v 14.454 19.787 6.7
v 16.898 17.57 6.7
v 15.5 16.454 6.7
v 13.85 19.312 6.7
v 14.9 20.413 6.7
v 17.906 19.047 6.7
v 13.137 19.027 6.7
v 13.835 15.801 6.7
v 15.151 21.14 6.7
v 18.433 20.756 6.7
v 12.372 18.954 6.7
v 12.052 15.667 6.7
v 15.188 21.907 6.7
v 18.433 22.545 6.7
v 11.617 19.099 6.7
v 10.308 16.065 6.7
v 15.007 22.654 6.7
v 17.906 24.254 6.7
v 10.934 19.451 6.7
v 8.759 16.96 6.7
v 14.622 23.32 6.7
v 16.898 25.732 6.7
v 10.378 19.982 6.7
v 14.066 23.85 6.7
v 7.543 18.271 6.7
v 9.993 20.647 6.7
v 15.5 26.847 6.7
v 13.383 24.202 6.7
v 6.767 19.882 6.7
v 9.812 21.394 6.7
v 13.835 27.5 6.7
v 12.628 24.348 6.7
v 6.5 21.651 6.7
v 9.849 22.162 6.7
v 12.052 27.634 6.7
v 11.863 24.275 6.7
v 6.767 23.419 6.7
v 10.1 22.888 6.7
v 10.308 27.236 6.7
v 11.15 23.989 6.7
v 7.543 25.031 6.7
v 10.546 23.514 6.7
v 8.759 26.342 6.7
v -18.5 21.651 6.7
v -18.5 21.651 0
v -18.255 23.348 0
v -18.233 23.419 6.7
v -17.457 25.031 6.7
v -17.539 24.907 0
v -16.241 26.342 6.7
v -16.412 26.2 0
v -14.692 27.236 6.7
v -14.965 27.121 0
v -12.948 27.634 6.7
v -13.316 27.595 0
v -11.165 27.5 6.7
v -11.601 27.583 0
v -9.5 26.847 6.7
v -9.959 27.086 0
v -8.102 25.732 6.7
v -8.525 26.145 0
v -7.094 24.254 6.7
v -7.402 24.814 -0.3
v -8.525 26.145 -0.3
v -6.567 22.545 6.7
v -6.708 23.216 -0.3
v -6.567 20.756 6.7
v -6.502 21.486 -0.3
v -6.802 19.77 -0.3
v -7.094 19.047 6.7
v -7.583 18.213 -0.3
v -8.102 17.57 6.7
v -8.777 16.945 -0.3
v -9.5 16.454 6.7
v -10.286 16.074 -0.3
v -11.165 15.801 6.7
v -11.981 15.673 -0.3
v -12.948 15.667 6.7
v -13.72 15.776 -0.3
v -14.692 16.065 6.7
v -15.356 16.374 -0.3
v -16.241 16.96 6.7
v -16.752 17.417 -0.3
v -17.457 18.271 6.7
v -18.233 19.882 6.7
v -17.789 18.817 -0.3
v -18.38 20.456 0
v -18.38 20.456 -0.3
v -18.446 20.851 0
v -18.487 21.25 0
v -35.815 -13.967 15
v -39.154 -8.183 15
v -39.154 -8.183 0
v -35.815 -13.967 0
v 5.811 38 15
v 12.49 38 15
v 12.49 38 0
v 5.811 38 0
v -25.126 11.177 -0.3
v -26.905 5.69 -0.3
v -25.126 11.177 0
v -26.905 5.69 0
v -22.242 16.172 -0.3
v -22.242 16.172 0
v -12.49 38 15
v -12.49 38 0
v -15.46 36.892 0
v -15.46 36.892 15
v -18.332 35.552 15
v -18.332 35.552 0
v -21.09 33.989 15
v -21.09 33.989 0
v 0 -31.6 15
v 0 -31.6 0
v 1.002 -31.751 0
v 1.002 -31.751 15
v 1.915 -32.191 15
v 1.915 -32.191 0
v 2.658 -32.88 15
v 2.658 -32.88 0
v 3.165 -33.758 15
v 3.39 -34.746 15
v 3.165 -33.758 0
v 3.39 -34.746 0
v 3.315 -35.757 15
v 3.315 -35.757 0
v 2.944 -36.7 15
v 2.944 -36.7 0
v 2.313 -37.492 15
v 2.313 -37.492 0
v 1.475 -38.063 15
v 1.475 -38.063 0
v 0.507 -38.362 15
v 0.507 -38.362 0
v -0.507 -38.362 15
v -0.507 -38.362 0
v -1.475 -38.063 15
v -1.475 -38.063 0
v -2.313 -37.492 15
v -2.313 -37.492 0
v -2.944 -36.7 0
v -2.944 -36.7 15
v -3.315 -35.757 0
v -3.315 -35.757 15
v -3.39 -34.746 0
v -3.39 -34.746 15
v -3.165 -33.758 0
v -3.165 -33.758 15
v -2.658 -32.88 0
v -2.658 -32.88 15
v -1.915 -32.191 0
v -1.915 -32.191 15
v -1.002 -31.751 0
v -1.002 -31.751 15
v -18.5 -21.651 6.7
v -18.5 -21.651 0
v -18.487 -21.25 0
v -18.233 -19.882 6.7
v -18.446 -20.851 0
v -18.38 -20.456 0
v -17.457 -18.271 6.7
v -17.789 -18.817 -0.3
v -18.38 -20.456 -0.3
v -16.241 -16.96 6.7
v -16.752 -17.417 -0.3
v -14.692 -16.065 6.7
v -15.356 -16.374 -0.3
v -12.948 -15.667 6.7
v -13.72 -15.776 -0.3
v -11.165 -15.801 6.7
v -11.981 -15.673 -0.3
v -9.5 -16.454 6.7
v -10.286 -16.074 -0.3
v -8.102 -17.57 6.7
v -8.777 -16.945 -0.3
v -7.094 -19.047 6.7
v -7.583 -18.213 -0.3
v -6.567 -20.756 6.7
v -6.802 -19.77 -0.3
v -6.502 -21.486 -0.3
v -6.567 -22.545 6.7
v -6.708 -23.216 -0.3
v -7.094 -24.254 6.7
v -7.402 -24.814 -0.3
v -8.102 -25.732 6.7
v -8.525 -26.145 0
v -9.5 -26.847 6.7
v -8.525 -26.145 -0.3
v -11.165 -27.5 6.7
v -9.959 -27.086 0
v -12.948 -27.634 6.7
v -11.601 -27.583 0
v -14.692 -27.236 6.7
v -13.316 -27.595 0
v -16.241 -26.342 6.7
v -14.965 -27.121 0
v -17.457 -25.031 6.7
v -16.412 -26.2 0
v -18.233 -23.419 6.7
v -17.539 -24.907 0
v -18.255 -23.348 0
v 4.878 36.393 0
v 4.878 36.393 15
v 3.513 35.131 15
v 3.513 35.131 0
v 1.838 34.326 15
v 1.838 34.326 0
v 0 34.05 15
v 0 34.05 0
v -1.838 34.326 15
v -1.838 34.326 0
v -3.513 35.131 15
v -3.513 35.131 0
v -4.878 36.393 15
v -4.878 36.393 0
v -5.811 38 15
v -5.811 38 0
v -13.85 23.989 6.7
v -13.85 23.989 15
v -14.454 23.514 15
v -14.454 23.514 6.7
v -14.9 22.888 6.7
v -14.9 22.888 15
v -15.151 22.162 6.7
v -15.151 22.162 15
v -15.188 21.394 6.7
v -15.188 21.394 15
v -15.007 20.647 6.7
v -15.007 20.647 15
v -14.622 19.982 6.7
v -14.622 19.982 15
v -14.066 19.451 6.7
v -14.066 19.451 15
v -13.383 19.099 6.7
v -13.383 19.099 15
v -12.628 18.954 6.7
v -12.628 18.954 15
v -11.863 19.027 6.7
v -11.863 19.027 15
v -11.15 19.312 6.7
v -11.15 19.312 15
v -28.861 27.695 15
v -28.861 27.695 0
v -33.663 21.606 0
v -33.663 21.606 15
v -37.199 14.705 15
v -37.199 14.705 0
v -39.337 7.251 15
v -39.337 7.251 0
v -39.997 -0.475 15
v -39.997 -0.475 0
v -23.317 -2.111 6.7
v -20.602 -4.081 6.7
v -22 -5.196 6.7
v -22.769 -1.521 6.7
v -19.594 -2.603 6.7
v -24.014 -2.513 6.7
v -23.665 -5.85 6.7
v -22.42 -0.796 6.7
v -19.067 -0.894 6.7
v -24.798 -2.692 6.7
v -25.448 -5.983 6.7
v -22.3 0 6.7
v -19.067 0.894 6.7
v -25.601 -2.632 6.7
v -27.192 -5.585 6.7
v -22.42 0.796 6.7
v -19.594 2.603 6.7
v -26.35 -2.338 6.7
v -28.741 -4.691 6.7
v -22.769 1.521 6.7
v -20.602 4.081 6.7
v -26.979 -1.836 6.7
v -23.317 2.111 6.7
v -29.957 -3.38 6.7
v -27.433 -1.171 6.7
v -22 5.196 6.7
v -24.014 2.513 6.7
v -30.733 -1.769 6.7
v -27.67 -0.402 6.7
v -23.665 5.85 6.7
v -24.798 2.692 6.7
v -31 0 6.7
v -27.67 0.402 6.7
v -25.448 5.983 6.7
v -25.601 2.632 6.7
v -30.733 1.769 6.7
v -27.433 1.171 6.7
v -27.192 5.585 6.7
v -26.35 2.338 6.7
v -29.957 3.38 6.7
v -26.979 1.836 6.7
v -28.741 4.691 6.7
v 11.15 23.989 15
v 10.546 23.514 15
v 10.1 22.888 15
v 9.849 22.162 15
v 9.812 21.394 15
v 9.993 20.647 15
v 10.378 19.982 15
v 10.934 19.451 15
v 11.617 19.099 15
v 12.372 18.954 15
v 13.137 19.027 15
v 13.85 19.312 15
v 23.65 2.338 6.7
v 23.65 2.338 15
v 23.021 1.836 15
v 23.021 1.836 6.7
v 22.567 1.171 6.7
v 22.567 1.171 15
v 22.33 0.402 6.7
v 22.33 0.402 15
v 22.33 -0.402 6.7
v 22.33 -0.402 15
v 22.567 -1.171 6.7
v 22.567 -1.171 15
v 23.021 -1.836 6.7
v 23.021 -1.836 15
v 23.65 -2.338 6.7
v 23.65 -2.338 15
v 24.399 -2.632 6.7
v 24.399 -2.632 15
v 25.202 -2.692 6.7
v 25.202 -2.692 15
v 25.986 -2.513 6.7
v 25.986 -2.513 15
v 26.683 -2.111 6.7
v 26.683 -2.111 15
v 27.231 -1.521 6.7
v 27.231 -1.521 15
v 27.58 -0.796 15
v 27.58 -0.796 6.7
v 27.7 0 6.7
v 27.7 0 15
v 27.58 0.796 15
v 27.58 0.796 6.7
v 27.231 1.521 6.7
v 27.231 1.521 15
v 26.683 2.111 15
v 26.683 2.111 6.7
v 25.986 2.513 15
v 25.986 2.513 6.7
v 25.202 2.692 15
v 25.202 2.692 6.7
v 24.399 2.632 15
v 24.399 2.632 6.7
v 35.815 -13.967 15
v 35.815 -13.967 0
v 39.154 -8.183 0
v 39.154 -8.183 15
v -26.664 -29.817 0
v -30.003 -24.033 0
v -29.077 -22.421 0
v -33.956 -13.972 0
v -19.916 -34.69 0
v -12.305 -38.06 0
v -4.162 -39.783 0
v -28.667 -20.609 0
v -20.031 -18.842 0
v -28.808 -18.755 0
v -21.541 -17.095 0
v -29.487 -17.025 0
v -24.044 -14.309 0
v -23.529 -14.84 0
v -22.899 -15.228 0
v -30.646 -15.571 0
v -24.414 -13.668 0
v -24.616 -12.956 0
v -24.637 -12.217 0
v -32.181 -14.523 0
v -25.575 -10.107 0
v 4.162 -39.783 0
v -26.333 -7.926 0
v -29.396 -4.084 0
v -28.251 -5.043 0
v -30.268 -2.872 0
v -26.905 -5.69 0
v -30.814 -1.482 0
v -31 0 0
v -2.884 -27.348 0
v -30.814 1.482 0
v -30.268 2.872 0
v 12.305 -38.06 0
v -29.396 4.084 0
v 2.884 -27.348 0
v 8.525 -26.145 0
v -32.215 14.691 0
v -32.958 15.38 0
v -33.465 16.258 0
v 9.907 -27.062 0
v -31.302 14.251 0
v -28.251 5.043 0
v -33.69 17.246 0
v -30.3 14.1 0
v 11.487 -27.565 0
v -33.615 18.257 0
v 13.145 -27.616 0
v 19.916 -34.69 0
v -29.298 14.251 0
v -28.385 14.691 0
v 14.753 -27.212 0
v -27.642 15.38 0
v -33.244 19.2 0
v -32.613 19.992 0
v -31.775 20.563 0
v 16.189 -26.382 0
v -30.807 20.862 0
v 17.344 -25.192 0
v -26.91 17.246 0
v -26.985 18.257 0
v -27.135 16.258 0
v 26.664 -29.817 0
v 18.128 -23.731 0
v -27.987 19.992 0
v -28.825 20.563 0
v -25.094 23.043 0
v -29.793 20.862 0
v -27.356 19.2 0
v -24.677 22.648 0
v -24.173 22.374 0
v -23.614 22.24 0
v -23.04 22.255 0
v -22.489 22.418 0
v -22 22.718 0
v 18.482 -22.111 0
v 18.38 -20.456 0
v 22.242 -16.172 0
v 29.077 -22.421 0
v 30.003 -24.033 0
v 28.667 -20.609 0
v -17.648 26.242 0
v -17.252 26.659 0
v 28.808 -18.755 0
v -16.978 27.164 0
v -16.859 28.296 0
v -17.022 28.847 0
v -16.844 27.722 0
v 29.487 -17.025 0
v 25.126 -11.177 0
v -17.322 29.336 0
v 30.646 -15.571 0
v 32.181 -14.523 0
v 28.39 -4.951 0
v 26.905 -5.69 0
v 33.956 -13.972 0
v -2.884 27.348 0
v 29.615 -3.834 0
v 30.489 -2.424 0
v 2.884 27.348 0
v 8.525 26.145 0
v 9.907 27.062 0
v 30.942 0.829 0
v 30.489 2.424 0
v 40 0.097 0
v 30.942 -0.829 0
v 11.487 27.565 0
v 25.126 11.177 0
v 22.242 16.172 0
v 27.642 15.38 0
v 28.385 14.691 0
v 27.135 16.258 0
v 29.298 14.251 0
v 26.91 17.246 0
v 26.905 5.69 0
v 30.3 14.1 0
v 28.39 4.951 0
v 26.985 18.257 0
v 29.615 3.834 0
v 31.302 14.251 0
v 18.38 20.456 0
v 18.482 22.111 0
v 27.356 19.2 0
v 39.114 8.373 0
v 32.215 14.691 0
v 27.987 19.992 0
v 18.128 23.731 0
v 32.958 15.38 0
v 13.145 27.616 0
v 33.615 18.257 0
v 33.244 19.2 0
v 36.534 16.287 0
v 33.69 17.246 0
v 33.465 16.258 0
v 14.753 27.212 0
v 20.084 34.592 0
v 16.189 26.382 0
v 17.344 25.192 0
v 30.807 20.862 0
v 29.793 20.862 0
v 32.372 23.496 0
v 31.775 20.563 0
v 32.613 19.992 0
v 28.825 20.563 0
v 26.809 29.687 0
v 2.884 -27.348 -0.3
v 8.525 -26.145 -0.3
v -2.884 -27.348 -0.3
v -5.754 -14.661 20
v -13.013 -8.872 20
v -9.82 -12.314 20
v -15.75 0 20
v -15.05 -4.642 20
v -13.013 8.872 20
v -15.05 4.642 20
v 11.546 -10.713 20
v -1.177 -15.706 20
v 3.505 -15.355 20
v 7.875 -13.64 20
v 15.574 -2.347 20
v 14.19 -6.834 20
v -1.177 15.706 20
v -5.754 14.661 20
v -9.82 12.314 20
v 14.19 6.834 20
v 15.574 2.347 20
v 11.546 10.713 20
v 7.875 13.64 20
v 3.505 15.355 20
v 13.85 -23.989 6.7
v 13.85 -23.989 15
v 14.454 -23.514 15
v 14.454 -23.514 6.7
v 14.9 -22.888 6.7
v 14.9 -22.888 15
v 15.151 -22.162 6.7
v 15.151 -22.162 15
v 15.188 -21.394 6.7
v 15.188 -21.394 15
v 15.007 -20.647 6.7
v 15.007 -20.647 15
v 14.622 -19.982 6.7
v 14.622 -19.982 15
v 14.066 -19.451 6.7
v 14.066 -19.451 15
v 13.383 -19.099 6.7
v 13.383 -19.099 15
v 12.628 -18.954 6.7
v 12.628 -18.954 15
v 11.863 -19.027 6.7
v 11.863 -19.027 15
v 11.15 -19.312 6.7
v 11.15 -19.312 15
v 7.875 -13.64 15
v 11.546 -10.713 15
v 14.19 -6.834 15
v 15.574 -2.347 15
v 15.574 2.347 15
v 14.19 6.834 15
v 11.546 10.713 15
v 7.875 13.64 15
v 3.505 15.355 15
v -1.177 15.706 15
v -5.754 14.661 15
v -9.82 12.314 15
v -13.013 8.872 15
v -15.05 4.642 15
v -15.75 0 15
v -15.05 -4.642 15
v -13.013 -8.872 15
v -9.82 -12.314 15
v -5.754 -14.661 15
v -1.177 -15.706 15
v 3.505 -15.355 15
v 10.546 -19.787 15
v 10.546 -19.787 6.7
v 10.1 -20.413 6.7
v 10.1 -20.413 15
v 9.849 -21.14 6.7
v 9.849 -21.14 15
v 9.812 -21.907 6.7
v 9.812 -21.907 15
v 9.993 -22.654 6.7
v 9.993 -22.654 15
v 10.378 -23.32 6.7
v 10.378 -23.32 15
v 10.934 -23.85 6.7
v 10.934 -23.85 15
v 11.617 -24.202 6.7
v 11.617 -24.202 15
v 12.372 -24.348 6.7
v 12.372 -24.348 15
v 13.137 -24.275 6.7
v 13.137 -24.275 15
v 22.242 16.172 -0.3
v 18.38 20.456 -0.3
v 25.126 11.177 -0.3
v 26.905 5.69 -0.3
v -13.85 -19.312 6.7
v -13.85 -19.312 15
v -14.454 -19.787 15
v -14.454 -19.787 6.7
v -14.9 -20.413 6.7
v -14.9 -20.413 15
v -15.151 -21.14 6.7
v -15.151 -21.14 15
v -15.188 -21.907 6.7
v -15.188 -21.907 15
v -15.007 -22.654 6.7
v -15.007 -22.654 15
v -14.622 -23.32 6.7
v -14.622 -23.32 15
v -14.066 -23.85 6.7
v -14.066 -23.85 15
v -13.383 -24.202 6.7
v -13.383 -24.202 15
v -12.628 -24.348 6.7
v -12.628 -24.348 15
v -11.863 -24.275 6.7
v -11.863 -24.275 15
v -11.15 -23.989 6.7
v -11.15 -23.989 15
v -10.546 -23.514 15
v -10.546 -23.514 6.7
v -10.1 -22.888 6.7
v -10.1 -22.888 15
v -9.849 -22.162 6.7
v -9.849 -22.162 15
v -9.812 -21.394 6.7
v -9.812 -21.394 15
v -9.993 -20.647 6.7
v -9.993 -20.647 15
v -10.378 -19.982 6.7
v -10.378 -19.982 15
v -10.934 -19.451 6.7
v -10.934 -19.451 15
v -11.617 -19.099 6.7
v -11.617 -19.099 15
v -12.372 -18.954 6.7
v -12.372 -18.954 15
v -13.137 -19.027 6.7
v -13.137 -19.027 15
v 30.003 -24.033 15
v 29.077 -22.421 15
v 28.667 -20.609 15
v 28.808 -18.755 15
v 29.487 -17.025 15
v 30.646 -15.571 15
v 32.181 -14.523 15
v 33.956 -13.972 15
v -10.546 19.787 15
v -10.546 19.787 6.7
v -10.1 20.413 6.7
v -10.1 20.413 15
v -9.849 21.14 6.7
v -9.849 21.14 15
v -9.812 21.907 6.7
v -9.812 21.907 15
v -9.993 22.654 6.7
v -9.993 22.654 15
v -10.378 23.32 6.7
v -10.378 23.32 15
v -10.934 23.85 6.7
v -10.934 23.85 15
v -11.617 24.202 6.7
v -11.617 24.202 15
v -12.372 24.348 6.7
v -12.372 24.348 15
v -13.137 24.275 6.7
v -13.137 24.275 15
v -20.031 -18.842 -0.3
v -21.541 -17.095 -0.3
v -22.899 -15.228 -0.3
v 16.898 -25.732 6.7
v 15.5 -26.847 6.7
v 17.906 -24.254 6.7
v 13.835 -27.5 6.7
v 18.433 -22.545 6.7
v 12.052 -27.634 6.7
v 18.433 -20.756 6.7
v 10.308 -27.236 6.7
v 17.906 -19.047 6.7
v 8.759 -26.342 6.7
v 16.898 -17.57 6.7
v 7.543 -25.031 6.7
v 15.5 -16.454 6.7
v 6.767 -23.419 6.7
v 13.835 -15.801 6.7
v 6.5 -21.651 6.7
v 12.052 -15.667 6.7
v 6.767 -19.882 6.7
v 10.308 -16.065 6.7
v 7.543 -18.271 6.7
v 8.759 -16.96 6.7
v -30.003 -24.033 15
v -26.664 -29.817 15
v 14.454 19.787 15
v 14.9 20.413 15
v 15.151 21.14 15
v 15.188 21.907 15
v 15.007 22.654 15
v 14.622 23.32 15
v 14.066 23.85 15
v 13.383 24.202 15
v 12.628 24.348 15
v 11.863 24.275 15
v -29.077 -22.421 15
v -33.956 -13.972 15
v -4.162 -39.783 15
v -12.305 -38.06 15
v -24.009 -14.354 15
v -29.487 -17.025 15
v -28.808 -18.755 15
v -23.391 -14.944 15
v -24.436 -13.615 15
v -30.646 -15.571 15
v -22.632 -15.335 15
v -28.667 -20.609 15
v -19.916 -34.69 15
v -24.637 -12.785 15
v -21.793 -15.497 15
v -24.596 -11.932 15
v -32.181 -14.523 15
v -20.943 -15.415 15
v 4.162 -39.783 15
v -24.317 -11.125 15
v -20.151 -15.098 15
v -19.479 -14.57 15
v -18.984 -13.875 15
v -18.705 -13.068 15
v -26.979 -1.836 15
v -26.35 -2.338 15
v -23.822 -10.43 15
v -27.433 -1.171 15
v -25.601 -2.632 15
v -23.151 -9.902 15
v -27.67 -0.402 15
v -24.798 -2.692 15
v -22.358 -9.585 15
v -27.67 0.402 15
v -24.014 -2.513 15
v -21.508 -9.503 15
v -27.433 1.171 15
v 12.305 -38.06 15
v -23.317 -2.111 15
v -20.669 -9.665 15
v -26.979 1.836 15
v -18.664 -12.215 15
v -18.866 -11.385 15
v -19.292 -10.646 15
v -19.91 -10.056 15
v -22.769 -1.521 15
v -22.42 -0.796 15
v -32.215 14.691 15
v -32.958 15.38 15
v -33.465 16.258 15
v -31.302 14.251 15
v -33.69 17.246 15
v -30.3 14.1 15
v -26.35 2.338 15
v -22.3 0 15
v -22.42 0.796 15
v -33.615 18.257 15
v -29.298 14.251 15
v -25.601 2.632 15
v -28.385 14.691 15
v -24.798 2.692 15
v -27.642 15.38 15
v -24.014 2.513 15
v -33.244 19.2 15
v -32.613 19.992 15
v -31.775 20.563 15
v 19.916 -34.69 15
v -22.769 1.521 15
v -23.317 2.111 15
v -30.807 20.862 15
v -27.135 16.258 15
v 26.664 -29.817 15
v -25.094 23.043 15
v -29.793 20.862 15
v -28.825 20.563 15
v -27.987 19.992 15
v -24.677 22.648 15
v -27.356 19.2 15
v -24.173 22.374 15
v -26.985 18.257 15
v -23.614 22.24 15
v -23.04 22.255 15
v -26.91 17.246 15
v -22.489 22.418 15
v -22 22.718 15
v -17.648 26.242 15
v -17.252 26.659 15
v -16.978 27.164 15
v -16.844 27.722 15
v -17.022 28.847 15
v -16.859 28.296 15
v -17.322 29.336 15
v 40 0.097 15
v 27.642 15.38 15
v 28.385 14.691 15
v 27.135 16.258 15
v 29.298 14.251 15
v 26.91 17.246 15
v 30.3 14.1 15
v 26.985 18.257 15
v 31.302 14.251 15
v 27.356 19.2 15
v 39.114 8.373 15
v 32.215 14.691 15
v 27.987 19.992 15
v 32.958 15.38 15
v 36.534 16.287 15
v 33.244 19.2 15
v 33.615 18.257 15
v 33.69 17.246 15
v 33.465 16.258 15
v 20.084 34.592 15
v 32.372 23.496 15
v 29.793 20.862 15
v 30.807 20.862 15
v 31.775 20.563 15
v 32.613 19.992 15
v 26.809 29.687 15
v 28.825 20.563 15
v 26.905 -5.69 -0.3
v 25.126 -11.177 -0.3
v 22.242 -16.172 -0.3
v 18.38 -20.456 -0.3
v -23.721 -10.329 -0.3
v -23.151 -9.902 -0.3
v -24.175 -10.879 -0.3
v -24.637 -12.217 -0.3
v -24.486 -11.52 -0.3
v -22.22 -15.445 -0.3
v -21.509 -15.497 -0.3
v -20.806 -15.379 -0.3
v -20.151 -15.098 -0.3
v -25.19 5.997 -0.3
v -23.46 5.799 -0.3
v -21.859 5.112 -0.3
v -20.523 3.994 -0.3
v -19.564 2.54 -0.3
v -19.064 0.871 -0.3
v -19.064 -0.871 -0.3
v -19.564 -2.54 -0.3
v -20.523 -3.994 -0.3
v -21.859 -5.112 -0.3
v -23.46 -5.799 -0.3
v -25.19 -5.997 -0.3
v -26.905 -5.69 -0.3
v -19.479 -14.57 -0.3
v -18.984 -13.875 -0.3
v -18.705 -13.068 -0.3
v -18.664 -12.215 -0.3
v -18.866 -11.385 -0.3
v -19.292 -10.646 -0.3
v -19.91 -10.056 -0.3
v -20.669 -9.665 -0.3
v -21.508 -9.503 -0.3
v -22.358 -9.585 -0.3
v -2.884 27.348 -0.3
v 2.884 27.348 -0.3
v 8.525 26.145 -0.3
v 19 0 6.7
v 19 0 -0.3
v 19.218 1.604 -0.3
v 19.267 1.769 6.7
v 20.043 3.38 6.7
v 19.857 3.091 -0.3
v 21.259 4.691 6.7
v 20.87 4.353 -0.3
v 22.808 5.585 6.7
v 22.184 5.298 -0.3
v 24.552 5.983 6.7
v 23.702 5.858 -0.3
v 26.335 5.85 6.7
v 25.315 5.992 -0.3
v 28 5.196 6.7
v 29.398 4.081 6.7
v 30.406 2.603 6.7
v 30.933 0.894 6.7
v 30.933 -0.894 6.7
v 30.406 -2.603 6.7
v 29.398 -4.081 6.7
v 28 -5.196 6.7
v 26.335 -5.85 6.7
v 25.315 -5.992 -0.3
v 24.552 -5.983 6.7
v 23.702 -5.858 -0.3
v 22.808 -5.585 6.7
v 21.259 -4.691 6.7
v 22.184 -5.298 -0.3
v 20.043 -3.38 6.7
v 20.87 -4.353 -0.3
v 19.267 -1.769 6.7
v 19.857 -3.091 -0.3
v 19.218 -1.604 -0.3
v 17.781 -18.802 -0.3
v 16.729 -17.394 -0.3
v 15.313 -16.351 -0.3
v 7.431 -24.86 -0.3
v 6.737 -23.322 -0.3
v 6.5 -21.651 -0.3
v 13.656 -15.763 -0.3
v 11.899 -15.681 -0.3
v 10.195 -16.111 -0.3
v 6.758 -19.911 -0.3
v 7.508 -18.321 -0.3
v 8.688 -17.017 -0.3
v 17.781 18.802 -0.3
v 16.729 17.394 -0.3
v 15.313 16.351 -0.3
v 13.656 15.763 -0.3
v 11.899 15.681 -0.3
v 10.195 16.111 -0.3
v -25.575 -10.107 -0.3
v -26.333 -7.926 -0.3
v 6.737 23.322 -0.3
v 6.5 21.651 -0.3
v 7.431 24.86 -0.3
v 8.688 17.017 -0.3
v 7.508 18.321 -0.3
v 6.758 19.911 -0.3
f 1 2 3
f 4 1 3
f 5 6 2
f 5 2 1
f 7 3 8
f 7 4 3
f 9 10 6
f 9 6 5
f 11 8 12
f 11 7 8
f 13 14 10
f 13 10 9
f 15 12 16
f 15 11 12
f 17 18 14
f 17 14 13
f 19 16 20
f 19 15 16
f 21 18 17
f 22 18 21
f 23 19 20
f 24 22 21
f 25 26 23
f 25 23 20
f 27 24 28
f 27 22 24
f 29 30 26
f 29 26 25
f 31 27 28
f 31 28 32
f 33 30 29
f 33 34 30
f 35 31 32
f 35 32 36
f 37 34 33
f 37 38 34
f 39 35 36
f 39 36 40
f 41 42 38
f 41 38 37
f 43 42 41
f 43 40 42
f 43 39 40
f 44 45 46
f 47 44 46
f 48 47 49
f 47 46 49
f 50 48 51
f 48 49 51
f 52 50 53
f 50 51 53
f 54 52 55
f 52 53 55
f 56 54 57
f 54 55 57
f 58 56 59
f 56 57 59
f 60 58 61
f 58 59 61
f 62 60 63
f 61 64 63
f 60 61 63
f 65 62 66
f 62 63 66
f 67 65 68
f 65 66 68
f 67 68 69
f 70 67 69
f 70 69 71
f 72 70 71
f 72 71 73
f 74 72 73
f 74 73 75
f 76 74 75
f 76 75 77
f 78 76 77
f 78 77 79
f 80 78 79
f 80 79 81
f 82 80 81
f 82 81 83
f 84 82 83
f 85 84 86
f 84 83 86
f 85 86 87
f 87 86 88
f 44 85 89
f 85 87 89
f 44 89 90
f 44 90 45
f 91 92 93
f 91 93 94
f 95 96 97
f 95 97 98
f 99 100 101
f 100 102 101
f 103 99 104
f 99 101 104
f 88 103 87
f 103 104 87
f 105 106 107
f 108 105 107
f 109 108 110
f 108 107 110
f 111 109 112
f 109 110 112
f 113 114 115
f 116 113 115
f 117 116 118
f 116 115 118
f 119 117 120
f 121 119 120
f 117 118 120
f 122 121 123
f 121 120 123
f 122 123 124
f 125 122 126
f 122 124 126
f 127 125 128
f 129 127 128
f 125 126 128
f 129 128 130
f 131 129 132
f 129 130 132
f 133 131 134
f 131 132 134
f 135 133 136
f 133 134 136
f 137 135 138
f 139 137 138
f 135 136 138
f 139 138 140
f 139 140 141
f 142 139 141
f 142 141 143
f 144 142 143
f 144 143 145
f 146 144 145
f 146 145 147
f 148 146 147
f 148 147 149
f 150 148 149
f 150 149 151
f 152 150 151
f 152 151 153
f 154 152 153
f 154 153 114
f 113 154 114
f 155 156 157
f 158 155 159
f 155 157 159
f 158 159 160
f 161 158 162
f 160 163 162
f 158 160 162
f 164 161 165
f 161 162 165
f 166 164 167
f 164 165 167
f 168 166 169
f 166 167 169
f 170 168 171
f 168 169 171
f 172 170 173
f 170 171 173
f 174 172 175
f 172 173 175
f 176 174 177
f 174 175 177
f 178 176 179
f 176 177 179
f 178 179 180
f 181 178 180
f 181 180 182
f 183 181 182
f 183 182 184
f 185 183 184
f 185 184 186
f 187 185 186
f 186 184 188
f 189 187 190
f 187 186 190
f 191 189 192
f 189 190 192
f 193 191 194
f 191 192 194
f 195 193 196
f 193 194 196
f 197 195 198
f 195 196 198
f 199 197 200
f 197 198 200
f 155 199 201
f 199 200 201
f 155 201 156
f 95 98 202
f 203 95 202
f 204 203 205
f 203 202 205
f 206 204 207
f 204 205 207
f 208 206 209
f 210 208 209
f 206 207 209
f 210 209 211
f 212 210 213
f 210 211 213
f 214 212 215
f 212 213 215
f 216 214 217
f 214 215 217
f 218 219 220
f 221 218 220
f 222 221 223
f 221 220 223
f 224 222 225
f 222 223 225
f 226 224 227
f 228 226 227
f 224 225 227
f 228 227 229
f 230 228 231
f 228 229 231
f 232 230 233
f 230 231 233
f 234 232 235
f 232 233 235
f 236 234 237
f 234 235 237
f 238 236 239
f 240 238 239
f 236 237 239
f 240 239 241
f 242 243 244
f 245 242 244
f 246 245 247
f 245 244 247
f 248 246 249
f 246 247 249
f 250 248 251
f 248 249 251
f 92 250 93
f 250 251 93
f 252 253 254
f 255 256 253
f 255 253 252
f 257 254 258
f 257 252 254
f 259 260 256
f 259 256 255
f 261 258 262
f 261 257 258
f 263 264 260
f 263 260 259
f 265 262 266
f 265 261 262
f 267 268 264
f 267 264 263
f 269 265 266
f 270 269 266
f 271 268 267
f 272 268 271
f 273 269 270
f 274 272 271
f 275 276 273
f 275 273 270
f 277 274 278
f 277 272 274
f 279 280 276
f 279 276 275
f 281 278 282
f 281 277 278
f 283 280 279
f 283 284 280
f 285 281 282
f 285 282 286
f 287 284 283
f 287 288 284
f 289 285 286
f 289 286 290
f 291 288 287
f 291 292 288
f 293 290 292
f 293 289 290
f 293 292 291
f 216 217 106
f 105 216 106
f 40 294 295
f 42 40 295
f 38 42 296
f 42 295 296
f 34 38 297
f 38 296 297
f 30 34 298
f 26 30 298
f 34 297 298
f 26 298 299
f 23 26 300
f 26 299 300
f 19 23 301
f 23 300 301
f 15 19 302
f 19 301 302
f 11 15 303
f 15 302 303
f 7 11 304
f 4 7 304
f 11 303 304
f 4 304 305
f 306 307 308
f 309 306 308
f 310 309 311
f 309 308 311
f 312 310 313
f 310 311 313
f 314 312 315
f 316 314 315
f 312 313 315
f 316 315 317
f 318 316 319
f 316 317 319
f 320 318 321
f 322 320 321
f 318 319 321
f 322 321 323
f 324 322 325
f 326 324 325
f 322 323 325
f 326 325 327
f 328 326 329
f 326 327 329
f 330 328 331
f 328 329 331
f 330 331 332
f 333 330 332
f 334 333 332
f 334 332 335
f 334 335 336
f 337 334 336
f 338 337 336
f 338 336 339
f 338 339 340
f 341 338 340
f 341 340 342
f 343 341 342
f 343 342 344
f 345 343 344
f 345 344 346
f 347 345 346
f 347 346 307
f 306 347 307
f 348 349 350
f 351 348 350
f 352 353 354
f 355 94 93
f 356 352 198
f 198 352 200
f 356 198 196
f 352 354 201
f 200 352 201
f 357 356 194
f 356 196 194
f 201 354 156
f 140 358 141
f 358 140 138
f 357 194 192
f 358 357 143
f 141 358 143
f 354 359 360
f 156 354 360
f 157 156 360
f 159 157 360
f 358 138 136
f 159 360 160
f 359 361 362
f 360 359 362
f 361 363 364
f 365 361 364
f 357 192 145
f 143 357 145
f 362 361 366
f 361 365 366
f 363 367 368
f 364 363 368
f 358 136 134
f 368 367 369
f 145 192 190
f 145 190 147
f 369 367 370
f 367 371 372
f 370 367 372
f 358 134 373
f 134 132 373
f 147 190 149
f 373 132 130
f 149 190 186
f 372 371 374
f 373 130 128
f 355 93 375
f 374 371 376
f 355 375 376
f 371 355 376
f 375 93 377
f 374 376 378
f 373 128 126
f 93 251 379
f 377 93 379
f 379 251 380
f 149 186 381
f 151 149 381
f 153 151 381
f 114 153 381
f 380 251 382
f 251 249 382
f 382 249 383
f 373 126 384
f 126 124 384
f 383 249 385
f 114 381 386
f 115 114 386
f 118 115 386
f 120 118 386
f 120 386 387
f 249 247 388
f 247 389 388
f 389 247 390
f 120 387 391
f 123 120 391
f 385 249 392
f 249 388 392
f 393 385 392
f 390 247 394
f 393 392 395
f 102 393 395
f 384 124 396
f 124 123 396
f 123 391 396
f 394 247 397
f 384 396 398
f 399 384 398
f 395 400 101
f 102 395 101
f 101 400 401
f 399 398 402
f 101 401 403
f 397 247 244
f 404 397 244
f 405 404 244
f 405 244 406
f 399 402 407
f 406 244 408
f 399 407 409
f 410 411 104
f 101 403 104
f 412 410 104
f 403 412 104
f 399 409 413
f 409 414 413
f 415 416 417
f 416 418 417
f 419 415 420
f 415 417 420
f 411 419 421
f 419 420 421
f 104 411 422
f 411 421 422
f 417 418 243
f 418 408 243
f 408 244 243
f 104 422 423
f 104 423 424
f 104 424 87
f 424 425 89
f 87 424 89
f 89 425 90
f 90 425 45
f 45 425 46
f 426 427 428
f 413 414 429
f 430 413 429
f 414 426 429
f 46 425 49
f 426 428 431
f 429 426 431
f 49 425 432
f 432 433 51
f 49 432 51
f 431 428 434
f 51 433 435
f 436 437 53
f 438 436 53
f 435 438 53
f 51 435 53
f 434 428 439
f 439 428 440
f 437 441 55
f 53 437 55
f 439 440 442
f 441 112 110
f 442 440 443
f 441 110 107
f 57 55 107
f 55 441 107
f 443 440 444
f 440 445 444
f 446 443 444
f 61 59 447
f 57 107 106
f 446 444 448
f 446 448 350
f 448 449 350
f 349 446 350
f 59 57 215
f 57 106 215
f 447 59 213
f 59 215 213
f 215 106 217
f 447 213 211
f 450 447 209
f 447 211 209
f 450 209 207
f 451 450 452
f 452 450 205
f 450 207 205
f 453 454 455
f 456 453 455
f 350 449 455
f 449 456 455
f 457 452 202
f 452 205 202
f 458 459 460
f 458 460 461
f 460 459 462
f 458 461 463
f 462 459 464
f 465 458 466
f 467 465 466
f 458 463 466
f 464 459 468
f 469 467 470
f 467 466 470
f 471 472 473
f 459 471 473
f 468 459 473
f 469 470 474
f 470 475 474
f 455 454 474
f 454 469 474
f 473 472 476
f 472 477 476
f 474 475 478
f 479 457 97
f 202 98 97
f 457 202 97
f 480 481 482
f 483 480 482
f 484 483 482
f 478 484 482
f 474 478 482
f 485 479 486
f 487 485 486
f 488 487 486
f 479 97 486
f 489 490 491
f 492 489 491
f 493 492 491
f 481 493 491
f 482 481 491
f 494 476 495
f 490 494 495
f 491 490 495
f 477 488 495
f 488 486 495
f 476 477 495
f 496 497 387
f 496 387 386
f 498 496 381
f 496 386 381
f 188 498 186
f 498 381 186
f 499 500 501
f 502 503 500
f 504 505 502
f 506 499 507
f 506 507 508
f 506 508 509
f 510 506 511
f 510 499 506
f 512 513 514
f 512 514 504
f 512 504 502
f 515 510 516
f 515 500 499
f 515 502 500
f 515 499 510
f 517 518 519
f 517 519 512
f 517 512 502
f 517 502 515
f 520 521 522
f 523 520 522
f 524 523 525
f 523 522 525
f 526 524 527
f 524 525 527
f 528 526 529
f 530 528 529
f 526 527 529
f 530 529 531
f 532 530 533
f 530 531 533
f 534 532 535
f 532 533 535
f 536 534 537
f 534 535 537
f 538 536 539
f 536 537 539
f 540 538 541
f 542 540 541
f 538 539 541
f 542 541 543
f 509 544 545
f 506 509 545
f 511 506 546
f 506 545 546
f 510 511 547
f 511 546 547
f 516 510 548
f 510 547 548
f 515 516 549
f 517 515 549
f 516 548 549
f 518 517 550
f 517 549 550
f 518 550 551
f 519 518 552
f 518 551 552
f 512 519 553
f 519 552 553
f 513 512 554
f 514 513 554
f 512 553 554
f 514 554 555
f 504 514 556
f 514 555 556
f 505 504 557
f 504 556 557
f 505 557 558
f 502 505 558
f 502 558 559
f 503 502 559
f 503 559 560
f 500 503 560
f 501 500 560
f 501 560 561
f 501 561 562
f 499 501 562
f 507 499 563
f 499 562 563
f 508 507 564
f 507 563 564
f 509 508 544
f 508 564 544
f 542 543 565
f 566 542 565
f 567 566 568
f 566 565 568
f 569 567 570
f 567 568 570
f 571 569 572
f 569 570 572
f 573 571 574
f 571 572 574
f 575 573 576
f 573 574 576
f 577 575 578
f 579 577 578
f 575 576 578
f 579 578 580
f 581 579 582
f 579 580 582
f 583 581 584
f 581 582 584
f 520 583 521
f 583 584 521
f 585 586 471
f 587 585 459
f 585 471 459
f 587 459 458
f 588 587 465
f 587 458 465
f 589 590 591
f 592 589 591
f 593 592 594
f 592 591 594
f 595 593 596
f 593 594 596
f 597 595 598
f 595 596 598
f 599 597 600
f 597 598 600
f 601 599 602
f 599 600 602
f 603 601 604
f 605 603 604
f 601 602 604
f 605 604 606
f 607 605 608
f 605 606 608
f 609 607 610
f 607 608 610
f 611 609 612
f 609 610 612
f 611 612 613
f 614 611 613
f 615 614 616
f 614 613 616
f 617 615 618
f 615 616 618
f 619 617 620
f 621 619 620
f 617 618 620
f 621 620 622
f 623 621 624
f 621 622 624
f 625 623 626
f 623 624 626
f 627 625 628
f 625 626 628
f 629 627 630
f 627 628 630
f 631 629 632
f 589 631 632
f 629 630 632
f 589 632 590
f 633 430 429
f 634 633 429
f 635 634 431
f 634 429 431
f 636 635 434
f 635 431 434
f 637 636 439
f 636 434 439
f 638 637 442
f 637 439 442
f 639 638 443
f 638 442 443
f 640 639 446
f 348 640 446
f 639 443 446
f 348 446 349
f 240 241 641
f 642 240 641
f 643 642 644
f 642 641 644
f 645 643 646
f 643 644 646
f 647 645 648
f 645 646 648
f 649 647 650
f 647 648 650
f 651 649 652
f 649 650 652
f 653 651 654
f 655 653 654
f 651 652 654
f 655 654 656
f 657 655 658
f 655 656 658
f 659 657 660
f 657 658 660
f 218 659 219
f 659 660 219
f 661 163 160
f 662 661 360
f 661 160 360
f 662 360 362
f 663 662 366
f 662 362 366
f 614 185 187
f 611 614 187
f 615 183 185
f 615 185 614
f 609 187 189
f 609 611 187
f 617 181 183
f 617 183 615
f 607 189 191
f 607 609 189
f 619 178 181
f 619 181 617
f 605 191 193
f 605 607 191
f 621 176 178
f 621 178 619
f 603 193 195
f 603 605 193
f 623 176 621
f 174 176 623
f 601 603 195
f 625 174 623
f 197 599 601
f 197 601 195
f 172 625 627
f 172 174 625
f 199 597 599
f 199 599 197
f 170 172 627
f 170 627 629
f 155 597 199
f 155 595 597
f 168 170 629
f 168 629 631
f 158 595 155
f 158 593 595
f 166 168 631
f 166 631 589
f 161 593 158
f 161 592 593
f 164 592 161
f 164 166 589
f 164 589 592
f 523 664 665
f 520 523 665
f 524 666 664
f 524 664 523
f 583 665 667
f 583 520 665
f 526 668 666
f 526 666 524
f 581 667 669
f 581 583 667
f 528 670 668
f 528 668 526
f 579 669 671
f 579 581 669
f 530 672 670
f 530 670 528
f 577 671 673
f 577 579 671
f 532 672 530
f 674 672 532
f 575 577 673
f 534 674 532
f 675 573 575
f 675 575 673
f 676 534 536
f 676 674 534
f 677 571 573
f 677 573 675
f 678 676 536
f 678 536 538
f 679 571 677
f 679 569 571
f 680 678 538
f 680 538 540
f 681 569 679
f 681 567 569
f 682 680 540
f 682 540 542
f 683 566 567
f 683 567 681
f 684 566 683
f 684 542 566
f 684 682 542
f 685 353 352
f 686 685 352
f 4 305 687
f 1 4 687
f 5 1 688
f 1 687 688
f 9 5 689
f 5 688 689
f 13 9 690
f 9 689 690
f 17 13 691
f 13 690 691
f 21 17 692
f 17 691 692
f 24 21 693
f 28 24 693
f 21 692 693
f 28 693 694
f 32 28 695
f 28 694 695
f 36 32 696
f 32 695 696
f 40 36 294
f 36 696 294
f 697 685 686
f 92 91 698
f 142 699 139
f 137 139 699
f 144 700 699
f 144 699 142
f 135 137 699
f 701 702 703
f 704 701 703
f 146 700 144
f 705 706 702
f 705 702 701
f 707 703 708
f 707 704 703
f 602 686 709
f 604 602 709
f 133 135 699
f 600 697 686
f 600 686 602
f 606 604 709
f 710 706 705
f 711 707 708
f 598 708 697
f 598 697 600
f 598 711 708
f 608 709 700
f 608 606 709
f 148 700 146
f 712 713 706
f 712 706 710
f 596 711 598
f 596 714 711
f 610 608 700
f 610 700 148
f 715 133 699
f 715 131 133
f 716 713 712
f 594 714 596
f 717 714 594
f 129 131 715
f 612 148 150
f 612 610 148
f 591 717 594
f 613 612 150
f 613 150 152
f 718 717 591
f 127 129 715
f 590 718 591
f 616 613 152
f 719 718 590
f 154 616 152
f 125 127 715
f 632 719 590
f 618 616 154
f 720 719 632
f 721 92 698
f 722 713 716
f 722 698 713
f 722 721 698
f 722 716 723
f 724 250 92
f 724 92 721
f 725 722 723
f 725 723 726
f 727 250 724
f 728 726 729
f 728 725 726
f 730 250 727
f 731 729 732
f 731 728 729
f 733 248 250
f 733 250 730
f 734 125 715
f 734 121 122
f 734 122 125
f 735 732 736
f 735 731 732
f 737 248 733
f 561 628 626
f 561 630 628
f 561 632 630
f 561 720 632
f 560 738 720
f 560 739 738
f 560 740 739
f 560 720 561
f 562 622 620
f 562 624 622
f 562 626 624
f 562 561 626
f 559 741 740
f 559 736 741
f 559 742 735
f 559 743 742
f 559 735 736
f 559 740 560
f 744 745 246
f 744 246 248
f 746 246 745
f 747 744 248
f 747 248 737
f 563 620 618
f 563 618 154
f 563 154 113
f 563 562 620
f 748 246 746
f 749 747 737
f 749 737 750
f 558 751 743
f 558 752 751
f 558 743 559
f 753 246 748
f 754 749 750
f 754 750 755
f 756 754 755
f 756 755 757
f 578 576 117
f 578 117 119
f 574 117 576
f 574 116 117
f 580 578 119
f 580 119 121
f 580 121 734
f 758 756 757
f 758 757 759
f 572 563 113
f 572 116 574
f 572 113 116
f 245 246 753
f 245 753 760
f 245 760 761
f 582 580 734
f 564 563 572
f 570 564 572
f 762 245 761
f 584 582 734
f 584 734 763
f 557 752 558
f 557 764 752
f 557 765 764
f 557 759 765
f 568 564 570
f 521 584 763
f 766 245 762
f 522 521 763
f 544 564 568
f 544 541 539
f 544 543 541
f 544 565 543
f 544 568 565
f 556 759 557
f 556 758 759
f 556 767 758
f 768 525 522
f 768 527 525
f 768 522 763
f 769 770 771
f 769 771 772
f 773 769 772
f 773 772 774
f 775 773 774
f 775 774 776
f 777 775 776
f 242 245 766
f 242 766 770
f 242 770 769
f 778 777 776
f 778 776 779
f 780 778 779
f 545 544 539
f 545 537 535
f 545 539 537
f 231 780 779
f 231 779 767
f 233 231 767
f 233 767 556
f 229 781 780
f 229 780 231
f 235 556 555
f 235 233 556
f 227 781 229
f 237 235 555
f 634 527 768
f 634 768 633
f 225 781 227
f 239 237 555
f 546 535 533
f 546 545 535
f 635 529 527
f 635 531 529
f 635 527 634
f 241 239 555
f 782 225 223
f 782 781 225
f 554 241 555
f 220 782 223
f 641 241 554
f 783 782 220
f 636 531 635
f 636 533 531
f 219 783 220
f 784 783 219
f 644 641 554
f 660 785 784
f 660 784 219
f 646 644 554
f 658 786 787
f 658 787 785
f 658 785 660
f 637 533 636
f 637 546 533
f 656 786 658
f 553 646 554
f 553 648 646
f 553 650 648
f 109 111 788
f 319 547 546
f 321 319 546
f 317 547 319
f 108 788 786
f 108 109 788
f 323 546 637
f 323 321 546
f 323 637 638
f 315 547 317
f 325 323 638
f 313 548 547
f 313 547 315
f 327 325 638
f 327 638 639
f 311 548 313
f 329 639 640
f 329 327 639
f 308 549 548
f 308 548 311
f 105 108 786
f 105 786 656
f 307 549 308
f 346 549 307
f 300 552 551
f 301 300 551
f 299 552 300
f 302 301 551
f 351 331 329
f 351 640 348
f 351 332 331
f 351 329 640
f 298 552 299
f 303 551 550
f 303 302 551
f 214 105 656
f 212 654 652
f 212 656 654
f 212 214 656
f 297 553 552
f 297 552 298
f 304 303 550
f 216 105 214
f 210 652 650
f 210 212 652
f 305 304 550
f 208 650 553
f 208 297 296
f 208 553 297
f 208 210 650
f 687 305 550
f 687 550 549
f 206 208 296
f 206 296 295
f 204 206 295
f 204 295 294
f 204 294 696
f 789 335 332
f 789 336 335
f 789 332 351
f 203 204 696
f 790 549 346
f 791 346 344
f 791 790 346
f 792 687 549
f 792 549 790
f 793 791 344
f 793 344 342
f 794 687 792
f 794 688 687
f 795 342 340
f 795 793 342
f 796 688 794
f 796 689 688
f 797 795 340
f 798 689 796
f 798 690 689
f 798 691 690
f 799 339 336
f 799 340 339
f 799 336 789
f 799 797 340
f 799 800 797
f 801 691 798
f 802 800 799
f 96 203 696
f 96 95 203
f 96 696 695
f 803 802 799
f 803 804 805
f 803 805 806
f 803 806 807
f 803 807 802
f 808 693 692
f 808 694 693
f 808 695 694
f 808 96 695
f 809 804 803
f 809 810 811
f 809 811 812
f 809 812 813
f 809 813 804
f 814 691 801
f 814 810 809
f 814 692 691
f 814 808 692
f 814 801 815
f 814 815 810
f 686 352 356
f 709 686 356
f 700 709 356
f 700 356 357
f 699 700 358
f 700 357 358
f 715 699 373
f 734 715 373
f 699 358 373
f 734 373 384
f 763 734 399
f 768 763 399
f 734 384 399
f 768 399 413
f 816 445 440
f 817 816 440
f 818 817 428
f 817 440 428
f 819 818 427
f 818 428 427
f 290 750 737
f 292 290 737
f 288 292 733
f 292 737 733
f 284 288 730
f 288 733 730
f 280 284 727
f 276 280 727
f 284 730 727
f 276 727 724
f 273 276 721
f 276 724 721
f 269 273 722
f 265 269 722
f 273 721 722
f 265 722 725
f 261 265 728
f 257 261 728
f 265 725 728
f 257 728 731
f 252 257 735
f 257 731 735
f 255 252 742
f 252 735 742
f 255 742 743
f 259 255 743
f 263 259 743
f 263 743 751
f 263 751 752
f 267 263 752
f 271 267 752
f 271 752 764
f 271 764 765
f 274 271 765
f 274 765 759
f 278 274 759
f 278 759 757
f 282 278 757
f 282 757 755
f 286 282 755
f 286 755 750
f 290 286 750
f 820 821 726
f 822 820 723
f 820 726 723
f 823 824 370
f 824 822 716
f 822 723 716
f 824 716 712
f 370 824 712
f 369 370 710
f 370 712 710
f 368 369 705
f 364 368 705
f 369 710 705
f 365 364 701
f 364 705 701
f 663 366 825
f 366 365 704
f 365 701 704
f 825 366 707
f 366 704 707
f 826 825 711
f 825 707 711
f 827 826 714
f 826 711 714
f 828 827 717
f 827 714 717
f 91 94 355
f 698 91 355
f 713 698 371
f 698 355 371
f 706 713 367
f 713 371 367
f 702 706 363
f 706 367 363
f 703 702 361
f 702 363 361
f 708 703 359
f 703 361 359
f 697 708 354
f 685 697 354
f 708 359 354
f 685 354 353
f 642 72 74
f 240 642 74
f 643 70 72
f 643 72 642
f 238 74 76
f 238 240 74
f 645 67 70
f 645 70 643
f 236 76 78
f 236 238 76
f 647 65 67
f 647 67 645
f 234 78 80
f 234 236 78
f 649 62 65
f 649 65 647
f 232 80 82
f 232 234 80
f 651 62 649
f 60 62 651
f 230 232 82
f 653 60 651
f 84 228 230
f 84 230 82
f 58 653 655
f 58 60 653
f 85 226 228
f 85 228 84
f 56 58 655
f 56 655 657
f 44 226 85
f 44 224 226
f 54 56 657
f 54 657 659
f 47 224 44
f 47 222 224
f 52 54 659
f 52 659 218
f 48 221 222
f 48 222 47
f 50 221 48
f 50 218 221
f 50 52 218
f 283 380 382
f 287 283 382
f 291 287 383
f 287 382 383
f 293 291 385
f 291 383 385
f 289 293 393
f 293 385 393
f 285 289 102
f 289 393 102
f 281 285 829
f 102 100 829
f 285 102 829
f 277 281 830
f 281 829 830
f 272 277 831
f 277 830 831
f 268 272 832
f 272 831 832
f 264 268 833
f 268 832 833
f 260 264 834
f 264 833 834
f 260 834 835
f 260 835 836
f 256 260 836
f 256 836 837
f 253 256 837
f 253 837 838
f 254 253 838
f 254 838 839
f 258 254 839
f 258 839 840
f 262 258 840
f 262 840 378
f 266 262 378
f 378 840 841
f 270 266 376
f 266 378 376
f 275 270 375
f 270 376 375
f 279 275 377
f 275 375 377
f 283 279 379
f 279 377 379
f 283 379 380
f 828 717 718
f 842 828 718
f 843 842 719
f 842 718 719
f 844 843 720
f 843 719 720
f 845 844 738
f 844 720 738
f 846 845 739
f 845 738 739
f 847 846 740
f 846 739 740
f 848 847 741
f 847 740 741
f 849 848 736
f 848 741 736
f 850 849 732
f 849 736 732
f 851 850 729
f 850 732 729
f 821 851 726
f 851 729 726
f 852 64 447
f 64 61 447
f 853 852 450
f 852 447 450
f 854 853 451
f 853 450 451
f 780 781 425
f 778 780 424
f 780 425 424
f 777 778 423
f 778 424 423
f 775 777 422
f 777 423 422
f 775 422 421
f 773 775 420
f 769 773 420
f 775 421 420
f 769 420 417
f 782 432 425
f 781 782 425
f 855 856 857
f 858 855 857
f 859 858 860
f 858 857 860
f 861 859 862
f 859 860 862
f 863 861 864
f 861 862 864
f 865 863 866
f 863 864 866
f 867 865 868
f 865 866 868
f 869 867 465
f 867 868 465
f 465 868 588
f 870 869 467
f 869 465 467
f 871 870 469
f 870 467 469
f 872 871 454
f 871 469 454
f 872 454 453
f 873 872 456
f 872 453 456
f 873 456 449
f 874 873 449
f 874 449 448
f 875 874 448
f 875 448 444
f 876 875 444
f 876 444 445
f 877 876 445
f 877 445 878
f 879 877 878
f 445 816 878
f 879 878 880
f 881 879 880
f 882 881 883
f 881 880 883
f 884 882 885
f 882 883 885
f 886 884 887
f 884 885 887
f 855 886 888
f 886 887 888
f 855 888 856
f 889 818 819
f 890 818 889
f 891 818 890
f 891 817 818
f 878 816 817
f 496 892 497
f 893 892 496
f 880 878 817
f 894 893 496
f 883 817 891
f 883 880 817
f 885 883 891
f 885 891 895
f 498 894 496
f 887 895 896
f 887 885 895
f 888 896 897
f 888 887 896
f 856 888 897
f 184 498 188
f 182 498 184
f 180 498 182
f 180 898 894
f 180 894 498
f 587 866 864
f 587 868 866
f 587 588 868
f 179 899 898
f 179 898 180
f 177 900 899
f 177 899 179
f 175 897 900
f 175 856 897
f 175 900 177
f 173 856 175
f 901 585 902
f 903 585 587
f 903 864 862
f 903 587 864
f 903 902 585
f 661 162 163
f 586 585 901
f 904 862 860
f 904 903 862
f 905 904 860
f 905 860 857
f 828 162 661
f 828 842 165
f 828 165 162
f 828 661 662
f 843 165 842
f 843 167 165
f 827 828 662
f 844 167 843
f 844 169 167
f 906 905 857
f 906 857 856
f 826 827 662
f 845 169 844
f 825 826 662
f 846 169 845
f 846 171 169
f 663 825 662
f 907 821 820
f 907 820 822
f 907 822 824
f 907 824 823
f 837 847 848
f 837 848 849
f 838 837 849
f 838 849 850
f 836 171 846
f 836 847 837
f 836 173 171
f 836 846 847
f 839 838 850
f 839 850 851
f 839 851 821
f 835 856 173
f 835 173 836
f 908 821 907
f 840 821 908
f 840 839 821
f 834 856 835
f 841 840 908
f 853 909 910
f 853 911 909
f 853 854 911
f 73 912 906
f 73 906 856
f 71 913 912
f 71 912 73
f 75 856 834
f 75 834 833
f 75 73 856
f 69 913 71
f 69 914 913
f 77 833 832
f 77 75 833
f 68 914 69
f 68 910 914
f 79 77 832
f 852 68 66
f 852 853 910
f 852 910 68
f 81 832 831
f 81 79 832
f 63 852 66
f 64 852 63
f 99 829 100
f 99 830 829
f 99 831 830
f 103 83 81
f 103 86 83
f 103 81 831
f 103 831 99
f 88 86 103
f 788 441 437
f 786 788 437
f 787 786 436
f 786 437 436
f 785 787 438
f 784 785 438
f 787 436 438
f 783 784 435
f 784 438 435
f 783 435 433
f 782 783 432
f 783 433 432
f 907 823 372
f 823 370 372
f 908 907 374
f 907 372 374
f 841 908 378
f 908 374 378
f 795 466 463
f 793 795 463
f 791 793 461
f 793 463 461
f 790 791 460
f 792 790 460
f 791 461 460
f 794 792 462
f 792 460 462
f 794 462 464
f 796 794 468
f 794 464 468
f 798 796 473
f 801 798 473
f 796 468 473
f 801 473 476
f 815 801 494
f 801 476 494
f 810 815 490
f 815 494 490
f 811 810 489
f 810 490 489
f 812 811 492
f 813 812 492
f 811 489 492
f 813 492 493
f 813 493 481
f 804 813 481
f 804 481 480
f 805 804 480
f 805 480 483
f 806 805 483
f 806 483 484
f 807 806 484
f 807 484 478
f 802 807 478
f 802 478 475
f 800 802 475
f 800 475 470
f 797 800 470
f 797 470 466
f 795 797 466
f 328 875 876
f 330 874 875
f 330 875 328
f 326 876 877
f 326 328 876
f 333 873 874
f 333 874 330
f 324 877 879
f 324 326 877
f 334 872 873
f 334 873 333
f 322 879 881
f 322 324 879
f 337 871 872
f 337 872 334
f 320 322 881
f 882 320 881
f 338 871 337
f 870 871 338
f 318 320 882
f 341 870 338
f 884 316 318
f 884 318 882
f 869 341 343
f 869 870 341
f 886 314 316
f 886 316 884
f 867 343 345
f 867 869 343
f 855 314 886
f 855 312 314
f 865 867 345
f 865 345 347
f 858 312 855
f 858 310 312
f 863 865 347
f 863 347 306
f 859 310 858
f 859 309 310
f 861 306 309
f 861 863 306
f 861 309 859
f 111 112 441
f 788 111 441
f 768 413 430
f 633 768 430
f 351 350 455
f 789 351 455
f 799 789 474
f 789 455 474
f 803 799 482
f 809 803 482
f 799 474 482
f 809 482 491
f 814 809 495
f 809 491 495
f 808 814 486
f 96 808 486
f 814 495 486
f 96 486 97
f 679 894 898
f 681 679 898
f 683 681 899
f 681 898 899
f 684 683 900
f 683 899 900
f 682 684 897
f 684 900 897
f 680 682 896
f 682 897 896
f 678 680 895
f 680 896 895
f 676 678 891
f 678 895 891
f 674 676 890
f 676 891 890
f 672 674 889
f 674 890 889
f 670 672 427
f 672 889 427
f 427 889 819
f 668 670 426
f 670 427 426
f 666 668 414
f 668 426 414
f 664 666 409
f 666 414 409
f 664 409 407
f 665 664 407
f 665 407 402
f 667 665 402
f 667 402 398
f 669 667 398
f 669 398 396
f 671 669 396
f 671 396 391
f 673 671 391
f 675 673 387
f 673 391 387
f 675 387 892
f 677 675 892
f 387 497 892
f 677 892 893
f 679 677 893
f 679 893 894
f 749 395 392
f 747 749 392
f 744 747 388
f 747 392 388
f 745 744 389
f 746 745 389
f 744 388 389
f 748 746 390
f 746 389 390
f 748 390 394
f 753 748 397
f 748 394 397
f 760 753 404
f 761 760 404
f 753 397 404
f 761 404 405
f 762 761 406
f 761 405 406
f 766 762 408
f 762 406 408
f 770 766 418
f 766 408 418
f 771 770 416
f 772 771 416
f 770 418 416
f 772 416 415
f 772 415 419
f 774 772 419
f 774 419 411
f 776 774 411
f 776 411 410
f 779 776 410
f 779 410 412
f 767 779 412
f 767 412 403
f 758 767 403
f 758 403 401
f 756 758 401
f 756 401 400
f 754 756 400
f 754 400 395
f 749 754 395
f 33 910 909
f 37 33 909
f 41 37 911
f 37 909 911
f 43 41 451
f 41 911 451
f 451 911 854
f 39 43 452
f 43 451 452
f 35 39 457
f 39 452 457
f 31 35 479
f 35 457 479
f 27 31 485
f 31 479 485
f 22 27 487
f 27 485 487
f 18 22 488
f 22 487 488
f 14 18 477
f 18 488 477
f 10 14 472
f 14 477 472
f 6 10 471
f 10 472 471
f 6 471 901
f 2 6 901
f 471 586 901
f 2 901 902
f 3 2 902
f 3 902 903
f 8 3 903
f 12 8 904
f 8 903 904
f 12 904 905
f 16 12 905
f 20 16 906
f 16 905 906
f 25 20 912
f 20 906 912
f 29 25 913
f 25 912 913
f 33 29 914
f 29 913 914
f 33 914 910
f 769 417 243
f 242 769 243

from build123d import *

# Parameters (mm, degrees)
ESTRUSIONE_ESTRUSIONE1_DEPTH = 15
ESTRUSIONE_ESTRUSIONE5_DEPTH = 0.3
TAGLIO_ESTRUSIONE1_DEPTH     = 16.3
TAGLIO_ESTRUSIONE2_DEPTH     = 16
ESTRUSIONE_ESTRUSIONE2_DEPTH = 5
SCHIZZO7_R                   = 6
TAGLIO_ESTRUSIONE3_DEPTH     = 7


with BuildPart() as part:
    # Schizzo1 → Estrusione-Estrusione1 (new body)
    with BuildSketch(Plane.XY):
        with BuildLine():
            Line((-5.811411188, 38), (-12.489995997, 38))
            ThreePointArc((-12.489995997, 38), (-16.909196271, 36.250228709), (-21.089648938, 33.988626151))
            Line((-21.089648938, 33.988626151), (-17.322367371, 29.336420856))
            ThreePointArc((-17.322367371, 29.336420856), (-16.844140316, 27.721953377), (-17.647583626, 26.242194881))
            Line((-17.647583626, 26.242194881), (-21.99960101, 22.718000691))
            ThreePointArc((-21.99960101, 22.718000691), (-23.61406849, 22.239773636), (-25.093826986, 23.043216946))
            Line((-25.093826986, 23.043216946), (-28.861108553, 27.695422241))
            ThreePointArc((-28.861108553, 27.695422241), (-38.449109313, 11.03023087), (-39.153963342, -8.183346174))
            Line((-39.153963342, -8.183346174), (-35.814606143, -13.967282507))
            ThreePointArc((-35.814606143, -13.967282507), (-29.487341226, -17.025), (-30.002912658, -24.033430901))
            Line((-30.002912658, -24.033430901), (-26.663967345, -29.816653826))
            ThreePointArc((-26.663967345, -29.816653826), (0, -40), (26.663967345, -29.816653826))
            Line((26.663967345, -29.816653826), (30.002912658, -24.033430901))
            ThreePointArc((30.002912658, -24.033430901), (29.487341226, -17.025), (35.814606143, -13.967282507))
            Line((35.814606143, -13.967282507), (39.153963342, -8.183346174))
            ThreePointArc((39.153963342, -8.183346174), (34.641016151, 20), (12.489995997, 38))
            Line((12.489995997, 38), (5.811411188, 38))
            ThreePointArc((5.811411188, 38), (0, 34.05), (-5.811411188, 38))
        make_face()
    extrude(amount=ESTRUSIONE_ESTRUSIONE1_DEPTH)

    # Schizzo5 → Estrusione-Estrusione5 (add)
    with BuildSketch(Plane(origin=(0, 0, 0), x_dir=(-1, 0, 0), z_dir=(0, 0, -1))):
        with BuildLine():
            ThreePointArc((0, -27.5), (27.5, 0), (0, 27.5))
            ThreePointArc((0, 27.5), (-27.5, 0), (0, -27.5))
        make_face()
    extrude(amount=ESTRUSIONE_ESTRUSIONE5_DEPTH)

    # Schizzo2 → Taglio-Estrusione1 (cut, through all)
    with BuildSketch(Plane.XY.offset(15)):
        with BuildLine():
            ThreePointArc((-23.150635095, -9.901923789), (-24.248711306, -14), (-20.150635095, -15.098076211))
            ThreePointArc((-20.150635095, -15.098076211), (-19.052558883, -11), (-23.150635095, -9.901923789))
        make_face()
        with BuildLine():
            ThreePointArc((-11.15, 19.312366504), (-10.16173141, 23.000635095), (-13.85, 23.988903685))
            ThreePointArc((-13.85, 23.988903685), (-14.83826859, 20.300635095), (-11.15, 19.312366504))
        make_face()
        with BuildLine():
            ThreePointArc((11.15, 23.988903685), (10.16173141, 20.300635095), (13.85, 19.312366504))
            ThreePointArc((13.85, 19.312366504), (14.83826859, 23.000635095), (11.15, 23.988903685))
        make_face()
        with BuildLine():
            ThreePointArc((26.35, -2.33826859), (27.33826859, 1.35), (23.65, 2.33826859))
            ThreePointArc((23.65, 2.33826859), (22.66173141, -1.35), (26.35, -2.33826859))
        make_face()
        with BuildLine():
            ThreePointArc((13.85, -23.988903685), (14.83826859, -20.300635095), (11.15, -19.312366504))
            ThreePointArc((11.15, -19.312366504), (10.16173141, -23.000635095), (13.85, -23.988903685))
        make_face()
        with BuildLine():
            ThreePointArc((-11.15, -23.988903685), (-10.16173141, -20.300635095), (-13.85, -19.312366504))
            ThreePointArc((-13.85, -19.312366504), (-14.83826859, -23.000635095), (-11.15, -23.988903685))
        make_face()
        with BuildLine():
            ThreePointArc((-23.65, -2.33826859), (-22.66173141, 1.35), (-26.35, 2.33826859))
            ThreePointArc((-26.35, 2.33826859), (-27.33826859, -1.35), (-23.65, -2.33826859))
        make_face()
    extrude(amount=-TAGLIO_ESTRUSIONE1_DEPTH, mode=Mode.SUBTRACT)

    # Schizzo3 → Taglio-Estrusione2 (cut, through all)
    with BuildSketch(Plane(origin=(0, 0, 0), x_dir=(-1, 0, 0), z_dir=(0, 0, -1))):
        with BuildLine():
            ThreePointArc((30.3, 20.9), (26.9, 17.5), (30.3, 14.1))
            ThreePointArc((30.3, 14.1), (33.7, 17.5), (30.3, 20.9))
        make_face()
        with BuildLine():
            ThreePointArc((0, -38.4), (3.4, -35), (0, -31.6))
            ThreePointArc((0, -31.6), (-3.4, -35), (0, -38.4))
        make_face()
        with BuildLine():
            ThreePointArc((-30.3, 20.9), (-33.7, 17.5), (-30.3, 14.1))
            ThreePointArc((-30.3, 14.1), (-26.9, 17.5), (-30.3, 20.9))
        make_face()
    extrude(amount=-TAGLIO_ESTRUSIONE2_DEPTH, mode=Mode.SUBTRACT)

    # Schizzo4 → Estrusione-Estrusione2 (add)
    with BuildSketch(Plane.XY.offset(15)):
        with BuildLine():
            ThreePointArc((-7.875, 13.63990011), (-13.63990011, -7.875), (7.875, -13.63990011))
            ThreePointArc((7.875, -13.63990011), (13.63990011, 7.875), (-7.875, 13.63990011))
        make_face()
    extrude(amount=ESTRUSIONE_ESTRUSIONE2_DEPTH)

    # Schizzo7 → Taglio-Estrusione3 (cut)
    with BuildSketch(Plane(origin=(0, 0, -0.3), x_dir=(-1, 0, 0), z_dir=(0, 0, -1))):
        with Locations((-12.5, 21.650635095)):
            Circle(SCHIZZO7_R)
        with Locations((12.5, 21.650635095)):
            Circle(SCHIZZO7_R)
        with Locations((25, 0)):
            Circle(SCHIZZO7_R)
        with Locations((12.5, -21.650635095)):
            Circle(SCHIZZO7_R)
        with Locations((-12.5, -21.650635095)):
            Circle(SCHIZZO7_R)
        with Locations((-25, 0)):
            Circle(SCHIZZO7_R)
    extrude(amount=-TAGLIO_ESTRUSIONE3_DEPTH, mode=Mode.SUBTRACT)


solid = part.part
